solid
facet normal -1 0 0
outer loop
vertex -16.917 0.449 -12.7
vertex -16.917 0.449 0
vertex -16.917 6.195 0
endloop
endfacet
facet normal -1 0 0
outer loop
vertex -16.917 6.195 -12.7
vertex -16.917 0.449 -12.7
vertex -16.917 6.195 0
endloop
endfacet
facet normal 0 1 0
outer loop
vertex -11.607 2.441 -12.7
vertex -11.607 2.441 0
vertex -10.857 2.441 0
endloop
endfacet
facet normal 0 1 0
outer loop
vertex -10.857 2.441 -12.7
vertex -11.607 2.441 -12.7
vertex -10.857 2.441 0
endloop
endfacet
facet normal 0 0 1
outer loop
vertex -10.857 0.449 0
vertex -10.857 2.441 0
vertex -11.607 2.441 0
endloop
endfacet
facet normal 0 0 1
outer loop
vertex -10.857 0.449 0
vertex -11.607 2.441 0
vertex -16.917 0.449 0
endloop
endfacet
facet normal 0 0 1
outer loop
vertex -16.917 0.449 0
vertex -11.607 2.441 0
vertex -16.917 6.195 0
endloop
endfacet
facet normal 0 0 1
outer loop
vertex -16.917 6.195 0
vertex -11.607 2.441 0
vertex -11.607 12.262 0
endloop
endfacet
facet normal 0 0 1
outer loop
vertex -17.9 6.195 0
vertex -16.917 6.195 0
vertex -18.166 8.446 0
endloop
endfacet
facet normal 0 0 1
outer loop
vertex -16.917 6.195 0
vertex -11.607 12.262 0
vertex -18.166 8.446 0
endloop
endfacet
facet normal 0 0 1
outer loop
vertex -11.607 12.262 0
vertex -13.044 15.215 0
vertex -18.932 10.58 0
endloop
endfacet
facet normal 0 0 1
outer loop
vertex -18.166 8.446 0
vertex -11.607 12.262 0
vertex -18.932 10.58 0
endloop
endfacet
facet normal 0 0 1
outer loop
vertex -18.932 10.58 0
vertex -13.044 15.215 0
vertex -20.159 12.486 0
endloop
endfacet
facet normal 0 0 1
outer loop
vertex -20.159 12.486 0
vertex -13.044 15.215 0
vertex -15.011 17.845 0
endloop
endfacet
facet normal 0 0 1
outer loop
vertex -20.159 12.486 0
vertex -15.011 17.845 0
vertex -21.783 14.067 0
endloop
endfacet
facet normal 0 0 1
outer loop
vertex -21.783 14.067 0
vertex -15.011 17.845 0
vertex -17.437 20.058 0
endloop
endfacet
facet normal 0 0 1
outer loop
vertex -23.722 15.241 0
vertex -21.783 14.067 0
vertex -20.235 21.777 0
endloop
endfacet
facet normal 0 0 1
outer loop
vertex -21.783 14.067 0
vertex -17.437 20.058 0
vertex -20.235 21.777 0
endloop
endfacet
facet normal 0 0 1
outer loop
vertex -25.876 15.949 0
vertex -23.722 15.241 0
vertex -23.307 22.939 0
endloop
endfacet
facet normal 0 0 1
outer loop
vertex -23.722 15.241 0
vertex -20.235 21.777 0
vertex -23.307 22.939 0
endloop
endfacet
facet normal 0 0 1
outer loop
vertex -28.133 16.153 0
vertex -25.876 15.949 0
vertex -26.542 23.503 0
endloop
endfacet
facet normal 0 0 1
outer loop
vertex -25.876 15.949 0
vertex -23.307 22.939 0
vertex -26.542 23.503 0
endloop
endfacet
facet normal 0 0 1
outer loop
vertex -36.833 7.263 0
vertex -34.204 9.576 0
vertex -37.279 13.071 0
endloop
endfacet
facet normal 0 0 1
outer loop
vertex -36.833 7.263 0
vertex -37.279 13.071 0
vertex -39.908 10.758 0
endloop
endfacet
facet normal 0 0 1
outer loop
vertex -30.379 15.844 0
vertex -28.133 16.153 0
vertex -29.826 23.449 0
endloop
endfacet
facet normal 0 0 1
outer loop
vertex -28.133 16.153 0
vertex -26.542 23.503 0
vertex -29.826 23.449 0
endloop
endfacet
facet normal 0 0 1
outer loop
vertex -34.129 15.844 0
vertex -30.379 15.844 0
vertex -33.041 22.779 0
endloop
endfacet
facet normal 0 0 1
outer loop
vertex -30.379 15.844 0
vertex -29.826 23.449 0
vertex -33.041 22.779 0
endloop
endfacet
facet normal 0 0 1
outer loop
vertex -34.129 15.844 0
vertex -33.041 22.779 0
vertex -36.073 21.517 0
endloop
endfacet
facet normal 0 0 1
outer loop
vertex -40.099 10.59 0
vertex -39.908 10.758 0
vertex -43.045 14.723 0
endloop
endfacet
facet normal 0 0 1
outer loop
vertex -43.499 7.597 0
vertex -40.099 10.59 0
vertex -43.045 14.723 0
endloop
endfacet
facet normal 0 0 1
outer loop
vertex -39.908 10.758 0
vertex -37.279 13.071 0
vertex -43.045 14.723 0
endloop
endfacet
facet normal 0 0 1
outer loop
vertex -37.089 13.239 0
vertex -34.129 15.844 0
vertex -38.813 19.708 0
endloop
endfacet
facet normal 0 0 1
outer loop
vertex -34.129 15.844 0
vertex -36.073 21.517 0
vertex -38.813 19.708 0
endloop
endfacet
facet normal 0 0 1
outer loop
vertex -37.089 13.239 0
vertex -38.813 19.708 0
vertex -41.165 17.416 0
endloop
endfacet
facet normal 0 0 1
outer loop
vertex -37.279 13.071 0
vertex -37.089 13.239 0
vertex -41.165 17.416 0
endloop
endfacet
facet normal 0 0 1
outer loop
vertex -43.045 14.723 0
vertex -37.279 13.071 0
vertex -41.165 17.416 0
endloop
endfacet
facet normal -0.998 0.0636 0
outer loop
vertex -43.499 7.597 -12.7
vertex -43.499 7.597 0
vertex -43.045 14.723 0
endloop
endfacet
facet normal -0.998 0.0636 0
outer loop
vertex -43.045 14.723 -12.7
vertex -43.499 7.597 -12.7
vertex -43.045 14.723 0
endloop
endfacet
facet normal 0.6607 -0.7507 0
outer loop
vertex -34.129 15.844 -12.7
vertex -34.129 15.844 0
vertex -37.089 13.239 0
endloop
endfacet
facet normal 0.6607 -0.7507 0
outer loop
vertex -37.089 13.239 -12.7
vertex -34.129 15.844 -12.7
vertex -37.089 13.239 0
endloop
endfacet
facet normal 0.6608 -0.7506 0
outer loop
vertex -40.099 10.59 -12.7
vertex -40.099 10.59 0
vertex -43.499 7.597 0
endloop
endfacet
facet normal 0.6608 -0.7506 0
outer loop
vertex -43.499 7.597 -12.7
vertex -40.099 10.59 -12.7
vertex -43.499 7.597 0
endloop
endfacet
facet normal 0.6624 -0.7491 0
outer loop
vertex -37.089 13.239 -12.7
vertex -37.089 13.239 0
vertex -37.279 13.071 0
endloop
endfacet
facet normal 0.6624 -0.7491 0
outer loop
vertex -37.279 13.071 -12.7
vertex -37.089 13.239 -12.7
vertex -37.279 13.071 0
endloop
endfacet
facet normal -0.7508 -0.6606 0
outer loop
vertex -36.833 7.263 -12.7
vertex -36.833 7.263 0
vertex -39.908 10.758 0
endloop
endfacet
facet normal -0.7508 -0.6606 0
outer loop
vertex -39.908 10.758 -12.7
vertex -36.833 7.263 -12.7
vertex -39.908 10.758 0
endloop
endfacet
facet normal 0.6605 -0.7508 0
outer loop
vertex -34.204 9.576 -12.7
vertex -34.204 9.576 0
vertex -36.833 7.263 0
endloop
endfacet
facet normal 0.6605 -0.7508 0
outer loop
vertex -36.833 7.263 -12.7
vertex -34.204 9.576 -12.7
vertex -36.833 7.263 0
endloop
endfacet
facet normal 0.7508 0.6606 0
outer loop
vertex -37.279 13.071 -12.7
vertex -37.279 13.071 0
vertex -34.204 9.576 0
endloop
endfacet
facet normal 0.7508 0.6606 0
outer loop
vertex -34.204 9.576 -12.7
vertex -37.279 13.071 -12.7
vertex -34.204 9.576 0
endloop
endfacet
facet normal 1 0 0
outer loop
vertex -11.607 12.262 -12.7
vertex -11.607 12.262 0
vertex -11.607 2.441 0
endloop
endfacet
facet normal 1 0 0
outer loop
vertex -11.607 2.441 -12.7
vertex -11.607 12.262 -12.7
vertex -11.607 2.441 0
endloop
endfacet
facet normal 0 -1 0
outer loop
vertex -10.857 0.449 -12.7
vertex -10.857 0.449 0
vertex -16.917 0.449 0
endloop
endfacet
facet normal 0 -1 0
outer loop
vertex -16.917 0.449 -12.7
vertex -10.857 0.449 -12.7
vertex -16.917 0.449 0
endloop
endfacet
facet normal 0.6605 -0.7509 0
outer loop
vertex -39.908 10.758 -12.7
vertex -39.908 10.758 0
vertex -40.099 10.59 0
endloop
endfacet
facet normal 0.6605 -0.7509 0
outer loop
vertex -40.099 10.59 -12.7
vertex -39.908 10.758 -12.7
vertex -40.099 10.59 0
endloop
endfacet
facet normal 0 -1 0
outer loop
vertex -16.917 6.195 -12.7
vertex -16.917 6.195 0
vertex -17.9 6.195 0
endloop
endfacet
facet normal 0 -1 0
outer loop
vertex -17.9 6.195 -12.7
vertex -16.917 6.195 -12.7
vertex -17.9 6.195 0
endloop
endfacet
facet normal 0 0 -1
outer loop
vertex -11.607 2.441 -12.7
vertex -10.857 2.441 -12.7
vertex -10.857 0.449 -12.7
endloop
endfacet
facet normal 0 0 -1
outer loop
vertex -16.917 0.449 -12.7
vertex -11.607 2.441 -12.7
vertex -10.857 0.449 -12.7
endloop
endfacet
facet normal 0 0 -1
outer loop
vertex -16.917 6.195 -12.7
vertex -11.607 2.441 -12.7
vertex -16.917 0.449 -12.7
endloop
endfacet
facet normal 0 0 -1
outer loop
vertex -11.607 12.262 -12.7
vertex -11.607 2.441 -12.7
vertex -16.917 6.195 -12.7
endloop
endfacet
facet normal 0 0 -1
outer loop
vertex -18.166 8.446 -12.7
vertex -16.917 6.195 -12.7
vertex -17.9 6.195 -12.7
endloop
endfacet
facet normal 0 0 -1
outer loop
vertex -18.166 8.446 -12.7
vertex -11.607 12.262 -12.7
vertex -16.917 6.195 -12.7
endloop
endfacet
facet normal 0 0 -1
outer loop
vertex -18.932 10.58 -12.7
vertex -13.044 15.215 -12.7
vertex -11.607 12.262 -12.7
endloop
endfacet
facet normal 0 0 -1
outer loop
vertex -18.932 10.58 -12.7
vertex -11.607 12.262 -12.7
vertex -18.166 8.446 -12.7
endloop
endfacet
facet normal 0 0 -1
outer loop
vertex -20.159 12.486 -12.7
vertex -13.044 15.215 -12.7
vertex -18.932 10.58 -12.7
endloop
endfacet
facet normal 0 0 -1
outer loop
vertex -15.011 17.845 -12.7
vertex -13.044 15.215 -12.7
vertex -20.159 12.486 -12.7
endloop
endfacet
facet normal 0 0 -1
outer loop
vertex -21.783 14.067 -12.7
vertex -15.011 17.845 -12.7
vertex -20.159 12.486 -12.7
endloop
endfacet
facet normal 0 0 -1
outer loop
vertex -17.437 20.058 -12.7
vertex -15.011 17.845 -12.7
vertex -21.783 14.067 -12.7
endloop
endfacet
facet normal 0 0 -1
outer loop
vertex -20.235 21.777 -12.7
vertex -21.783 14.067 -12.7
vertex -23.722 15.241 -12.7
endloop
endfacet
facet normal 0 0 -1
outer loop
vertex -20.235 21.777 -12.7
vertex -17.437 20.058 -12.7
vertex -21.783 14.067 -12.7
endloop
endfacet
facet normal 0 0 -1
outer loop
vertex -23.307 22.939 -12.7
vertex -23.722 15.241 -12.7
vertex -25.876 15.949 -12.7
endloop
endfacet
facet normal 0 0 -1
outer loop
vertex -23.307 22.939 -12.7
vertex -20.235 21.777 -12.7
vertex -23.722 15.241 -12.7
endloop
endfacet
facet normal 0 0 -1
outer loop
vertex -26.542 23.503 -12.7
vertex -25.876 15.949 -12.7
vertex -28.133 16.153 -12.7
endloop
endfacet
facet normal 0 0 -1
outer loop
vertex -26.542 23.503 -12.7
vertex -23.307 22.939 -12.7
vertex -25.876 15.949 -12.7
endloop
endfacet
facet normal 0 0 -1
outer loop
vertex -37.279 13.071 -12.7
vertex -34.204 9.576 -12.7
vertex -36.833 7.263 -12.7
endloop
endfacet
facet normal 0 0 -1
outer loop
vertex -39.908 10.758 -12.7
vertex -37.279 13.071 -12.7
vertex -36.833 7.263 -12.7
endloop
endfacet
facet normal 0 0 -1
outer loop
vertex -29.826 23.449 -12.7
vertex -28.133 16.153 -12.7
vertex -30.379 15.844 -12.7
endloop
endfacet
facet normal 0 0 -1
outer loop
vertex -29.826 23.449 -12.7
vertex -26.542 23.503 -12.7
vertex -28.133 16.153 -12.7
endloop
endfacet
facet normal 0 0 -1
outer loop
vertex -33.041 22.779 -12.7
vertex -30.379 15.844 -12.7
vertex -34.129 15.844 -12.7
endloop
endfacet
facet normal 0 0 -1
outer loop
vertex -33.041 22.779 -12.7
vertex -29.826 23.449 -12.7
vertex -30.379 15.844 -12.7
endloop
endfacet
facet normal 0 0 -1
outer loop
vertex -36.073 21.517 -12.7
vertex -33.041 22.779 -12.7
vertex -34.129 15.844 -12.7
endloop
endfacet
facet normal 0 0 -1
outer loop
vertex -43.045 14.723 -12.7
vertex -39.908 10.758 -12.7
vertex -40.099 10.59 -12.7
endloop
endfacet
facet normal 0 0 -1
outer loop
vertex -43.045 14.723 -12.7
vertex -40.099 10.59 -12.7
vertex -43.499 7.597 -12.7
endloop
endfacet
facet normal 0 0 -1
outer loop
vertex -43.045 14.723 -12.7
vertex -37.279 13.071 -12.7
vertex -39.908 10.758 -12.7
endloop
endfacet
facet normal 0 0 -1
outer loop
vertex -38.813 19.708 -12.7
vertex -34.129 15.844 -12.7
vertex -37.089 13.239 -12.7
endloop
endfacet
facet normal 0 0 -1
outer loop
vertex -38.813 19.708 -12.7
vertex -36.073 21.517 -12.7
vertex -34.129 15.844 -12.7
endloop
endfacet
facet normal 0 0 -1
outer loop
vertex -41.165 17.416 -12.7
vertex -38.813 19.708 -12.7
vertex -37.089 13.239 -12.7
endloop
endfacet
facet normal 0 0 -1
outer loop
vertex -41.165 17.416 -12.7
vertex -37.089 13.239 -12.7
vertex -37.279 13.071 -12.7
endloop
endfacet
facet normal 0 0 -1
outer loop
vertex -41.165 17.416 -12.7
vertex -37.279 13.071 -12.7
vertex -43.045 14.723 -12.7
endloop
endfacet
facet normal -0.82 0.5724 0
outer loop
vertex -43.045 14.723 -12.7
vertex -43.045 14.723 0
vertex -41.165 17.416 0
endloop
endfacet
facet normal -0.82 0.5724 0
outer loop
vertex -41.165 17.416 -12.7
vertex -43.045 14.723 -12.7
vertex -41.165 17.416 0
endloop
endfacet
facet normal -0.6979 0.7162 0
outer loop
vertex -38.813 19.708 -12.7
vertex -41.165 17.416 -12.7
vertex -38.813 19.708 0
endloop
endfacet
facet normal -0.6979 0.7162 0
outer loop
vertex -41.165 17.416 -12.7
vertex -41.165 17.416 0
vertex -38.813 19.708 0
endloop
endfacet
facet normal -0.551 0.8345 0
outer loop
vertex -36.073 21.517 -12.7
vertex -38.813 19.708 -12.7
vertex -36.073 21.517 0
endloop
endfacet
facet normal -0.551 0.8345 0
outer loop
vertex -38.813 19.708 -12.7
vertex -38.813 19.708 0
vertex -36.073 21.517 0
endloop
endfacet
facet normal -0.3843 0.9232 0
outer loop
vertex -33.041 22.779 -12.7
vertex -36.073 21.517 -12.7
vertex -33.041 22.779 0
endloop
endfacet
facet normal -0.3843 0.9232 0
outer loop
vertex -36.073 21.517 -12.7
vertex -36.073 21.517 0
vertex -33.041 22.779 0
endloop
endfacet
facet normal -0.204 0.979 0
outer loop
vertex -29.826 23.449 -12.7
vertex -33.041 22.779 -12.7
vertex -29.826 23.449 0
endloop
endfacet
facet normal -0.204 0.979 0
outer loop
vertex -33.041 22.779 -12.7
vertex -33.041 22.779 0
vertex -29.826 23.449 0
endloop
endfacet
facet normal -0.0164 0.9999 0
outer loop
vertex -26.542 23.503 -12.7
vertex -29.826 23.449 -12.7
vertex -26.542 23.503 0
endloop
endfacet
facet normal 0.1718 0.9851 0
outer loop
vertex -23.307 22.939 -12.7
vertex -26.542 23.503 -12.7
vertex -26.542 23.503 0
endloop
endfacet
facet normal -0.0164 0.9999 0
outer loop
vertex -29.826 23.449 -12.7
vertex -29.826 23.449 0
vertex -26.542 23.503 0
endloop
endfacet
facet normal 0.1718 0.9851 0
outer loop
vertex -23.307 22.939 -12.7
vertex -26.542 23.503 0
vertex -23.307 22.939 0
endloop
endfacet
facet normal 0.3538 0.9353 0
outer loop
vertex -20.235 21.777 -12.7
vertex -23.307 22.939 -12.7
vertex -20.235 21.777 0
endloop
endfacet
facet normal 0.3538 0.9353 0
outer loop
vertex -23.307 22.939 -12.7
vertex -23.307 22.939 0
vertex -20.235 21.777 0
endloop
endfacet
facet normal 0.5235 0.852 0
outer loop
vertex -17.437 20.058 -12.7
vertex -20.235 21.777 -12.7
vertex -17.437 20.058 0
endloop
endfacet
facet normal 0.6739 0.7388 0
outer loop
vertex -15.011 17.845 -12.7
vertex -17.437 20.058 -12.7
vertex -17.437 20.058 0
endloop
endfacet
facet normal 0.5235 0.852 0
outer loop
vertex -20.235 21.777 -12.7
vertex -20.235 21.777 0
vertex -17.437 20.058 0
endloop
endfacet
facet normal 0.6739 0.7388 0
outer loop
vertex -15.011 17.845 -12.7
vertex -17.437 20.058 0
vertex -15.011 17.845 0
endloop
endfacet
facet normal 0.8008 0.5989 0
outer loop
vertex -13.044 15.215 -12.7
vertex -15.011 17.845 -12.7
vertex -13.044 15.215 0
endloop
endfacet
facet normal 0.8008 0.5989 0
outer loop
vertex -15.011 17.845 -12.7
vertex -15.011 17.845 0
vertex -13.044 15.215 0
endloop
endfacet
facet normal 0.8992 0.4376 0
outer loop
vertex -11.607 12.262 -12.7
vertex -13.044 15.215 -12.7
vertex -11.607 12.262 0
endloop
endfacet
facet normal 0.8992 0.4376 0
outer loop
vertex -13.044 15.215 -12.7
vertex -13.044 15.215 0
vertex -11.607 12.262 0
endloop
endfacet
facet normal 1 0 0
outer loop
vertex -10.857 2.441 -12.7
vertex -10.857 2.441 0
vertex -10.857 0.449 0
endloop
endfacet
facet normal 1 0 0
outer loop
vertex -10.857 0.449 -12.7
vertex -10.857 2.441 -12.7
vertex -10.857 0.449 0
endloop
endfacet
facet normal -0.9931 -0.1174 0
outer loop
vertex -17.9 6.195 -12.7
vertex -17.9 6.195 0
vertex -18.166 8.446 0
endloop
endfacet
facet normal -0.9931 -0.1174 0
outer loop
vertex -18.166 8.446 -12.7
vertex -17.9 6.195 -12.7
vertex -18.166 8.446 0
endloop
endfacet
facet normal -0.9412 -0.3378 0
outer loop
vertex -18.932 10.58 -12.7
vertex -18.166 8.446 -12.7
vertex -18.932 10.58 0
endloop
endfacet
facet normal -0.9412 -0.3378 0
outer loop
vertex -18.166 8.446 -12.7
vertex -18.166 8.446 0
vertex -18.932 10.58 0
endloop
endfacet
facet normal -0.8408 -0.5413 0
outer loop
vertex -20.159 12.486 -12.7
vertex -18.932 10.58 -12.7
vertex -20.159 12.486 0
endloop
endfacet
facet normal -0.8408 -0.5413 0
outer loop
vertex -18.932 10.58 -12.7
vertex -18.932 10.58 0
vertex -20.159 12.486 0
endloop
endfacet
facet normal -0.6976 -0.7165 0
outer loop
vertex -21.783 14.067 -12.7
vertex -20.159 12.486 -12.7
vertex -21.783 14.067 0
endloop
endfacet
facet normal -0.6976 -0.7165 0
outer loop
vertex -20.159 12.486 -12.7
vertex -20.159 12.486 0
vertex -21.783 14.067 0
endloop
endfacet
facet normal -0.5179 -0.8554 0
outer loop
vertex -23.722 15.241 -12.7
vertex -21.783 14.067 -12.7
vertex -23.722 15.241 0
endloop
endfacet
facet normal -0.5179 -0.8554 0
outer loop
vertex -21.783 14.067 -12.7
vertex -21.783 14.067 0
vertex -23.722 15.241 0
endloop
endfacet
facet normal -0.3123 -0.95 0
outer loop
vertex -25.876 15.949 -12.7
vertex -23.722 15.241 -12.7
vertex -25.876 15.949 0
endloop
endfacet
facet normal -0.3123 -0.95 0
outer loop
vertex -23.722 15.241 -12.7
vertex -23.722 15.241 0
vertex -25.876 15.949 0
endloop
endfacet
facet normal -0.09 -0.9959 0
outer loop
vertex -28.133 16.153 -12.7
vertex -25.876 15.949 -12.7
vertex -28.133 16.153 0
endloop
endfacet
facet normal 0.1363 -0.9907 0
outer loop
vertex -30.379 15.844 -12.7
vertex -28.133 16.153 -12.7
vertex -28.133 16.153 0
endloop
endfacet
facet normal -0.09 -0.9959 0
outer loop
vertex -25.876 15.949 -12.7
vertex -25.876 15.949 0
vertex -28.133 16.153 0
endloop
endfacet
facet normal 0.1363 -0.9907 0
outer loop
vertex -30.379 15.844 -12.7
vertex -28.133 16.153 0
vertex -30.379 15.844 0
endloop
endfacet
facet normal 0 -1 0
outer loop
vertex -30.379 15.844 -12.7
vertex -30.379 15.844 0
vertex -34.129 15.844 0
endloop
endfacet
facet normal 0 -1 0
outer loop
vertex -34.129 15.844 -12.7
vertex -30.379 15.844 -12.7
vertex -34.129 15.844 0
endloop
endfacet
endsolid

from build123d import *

# Parameters (mm, degrees)
BOSS_EXTRUDE1_DEPTH = 12.7


with BuildPart() as part:
    # Sketch3 → Boss-Extrude1 (new body)
    with BuildSketch(Plane.XY):
        with BuildLine():
            Line((-39.908456621, 10.757671301), (-40.099131524, 10.589864623))
            Line((-40.099131524, 10.589864623), (-43.499378585, 7.5974196))
            Line((-43.499378585, 7.5974196), (-43.044803336, 14.723327074))
            ThreePointArc((-43.044803336, 14.723327074), (-26.54219977, 23.502903952), (-11.60681582, 12.262298946))
            Line((-11.60681582, 12.262298946), (-11.60681582, 5.15464013))
            Line((-11.60681582, 5.15464013), (-11.60681582, 2.440752288))
            Line((-11.60681582, 2.440752288), (-10.85681582, 2.440752288))
            Line((-10.85681582, 2.440752288), (-10.85681582, 0.448752288))
            Line((-10.85681582, 0.448752288), (-16.916890922, 0.448752288))
            Line((-16.916890922, 0.448752288), (-16.916890922, 6.194752288))
            Line((-16.916890922, 6.194752288), (-17.900227072, 6.194752288))
            ThreePointArc((-17.900227072, 6.194752288), (-21.783197569, 14.066907933), (-30.379177034, 15.843824196))
            Line((-30.379177034, 15.843824196), (-34.129177034, 15.843824196))
            Line((-34.129177034, 15.843824196), (-37.088703748, 13.23924258))
            Line((-37.088703748, 13.23924258), (-37.279378651, 13.071435901))
            Line((-37.279378651, 13.071435901), (-34.203525113, 9.576413645))
            Line((-34.203525113, 9.576413645), (-36.832603083, 7.262649045))
            Line((-36.832603083, 7.262649045), (-39.908456621, 10.757671301))
        make_face()
    extrude(amount=-BOSS_EXTRUDE1_DEPTH)


solid = part.part
